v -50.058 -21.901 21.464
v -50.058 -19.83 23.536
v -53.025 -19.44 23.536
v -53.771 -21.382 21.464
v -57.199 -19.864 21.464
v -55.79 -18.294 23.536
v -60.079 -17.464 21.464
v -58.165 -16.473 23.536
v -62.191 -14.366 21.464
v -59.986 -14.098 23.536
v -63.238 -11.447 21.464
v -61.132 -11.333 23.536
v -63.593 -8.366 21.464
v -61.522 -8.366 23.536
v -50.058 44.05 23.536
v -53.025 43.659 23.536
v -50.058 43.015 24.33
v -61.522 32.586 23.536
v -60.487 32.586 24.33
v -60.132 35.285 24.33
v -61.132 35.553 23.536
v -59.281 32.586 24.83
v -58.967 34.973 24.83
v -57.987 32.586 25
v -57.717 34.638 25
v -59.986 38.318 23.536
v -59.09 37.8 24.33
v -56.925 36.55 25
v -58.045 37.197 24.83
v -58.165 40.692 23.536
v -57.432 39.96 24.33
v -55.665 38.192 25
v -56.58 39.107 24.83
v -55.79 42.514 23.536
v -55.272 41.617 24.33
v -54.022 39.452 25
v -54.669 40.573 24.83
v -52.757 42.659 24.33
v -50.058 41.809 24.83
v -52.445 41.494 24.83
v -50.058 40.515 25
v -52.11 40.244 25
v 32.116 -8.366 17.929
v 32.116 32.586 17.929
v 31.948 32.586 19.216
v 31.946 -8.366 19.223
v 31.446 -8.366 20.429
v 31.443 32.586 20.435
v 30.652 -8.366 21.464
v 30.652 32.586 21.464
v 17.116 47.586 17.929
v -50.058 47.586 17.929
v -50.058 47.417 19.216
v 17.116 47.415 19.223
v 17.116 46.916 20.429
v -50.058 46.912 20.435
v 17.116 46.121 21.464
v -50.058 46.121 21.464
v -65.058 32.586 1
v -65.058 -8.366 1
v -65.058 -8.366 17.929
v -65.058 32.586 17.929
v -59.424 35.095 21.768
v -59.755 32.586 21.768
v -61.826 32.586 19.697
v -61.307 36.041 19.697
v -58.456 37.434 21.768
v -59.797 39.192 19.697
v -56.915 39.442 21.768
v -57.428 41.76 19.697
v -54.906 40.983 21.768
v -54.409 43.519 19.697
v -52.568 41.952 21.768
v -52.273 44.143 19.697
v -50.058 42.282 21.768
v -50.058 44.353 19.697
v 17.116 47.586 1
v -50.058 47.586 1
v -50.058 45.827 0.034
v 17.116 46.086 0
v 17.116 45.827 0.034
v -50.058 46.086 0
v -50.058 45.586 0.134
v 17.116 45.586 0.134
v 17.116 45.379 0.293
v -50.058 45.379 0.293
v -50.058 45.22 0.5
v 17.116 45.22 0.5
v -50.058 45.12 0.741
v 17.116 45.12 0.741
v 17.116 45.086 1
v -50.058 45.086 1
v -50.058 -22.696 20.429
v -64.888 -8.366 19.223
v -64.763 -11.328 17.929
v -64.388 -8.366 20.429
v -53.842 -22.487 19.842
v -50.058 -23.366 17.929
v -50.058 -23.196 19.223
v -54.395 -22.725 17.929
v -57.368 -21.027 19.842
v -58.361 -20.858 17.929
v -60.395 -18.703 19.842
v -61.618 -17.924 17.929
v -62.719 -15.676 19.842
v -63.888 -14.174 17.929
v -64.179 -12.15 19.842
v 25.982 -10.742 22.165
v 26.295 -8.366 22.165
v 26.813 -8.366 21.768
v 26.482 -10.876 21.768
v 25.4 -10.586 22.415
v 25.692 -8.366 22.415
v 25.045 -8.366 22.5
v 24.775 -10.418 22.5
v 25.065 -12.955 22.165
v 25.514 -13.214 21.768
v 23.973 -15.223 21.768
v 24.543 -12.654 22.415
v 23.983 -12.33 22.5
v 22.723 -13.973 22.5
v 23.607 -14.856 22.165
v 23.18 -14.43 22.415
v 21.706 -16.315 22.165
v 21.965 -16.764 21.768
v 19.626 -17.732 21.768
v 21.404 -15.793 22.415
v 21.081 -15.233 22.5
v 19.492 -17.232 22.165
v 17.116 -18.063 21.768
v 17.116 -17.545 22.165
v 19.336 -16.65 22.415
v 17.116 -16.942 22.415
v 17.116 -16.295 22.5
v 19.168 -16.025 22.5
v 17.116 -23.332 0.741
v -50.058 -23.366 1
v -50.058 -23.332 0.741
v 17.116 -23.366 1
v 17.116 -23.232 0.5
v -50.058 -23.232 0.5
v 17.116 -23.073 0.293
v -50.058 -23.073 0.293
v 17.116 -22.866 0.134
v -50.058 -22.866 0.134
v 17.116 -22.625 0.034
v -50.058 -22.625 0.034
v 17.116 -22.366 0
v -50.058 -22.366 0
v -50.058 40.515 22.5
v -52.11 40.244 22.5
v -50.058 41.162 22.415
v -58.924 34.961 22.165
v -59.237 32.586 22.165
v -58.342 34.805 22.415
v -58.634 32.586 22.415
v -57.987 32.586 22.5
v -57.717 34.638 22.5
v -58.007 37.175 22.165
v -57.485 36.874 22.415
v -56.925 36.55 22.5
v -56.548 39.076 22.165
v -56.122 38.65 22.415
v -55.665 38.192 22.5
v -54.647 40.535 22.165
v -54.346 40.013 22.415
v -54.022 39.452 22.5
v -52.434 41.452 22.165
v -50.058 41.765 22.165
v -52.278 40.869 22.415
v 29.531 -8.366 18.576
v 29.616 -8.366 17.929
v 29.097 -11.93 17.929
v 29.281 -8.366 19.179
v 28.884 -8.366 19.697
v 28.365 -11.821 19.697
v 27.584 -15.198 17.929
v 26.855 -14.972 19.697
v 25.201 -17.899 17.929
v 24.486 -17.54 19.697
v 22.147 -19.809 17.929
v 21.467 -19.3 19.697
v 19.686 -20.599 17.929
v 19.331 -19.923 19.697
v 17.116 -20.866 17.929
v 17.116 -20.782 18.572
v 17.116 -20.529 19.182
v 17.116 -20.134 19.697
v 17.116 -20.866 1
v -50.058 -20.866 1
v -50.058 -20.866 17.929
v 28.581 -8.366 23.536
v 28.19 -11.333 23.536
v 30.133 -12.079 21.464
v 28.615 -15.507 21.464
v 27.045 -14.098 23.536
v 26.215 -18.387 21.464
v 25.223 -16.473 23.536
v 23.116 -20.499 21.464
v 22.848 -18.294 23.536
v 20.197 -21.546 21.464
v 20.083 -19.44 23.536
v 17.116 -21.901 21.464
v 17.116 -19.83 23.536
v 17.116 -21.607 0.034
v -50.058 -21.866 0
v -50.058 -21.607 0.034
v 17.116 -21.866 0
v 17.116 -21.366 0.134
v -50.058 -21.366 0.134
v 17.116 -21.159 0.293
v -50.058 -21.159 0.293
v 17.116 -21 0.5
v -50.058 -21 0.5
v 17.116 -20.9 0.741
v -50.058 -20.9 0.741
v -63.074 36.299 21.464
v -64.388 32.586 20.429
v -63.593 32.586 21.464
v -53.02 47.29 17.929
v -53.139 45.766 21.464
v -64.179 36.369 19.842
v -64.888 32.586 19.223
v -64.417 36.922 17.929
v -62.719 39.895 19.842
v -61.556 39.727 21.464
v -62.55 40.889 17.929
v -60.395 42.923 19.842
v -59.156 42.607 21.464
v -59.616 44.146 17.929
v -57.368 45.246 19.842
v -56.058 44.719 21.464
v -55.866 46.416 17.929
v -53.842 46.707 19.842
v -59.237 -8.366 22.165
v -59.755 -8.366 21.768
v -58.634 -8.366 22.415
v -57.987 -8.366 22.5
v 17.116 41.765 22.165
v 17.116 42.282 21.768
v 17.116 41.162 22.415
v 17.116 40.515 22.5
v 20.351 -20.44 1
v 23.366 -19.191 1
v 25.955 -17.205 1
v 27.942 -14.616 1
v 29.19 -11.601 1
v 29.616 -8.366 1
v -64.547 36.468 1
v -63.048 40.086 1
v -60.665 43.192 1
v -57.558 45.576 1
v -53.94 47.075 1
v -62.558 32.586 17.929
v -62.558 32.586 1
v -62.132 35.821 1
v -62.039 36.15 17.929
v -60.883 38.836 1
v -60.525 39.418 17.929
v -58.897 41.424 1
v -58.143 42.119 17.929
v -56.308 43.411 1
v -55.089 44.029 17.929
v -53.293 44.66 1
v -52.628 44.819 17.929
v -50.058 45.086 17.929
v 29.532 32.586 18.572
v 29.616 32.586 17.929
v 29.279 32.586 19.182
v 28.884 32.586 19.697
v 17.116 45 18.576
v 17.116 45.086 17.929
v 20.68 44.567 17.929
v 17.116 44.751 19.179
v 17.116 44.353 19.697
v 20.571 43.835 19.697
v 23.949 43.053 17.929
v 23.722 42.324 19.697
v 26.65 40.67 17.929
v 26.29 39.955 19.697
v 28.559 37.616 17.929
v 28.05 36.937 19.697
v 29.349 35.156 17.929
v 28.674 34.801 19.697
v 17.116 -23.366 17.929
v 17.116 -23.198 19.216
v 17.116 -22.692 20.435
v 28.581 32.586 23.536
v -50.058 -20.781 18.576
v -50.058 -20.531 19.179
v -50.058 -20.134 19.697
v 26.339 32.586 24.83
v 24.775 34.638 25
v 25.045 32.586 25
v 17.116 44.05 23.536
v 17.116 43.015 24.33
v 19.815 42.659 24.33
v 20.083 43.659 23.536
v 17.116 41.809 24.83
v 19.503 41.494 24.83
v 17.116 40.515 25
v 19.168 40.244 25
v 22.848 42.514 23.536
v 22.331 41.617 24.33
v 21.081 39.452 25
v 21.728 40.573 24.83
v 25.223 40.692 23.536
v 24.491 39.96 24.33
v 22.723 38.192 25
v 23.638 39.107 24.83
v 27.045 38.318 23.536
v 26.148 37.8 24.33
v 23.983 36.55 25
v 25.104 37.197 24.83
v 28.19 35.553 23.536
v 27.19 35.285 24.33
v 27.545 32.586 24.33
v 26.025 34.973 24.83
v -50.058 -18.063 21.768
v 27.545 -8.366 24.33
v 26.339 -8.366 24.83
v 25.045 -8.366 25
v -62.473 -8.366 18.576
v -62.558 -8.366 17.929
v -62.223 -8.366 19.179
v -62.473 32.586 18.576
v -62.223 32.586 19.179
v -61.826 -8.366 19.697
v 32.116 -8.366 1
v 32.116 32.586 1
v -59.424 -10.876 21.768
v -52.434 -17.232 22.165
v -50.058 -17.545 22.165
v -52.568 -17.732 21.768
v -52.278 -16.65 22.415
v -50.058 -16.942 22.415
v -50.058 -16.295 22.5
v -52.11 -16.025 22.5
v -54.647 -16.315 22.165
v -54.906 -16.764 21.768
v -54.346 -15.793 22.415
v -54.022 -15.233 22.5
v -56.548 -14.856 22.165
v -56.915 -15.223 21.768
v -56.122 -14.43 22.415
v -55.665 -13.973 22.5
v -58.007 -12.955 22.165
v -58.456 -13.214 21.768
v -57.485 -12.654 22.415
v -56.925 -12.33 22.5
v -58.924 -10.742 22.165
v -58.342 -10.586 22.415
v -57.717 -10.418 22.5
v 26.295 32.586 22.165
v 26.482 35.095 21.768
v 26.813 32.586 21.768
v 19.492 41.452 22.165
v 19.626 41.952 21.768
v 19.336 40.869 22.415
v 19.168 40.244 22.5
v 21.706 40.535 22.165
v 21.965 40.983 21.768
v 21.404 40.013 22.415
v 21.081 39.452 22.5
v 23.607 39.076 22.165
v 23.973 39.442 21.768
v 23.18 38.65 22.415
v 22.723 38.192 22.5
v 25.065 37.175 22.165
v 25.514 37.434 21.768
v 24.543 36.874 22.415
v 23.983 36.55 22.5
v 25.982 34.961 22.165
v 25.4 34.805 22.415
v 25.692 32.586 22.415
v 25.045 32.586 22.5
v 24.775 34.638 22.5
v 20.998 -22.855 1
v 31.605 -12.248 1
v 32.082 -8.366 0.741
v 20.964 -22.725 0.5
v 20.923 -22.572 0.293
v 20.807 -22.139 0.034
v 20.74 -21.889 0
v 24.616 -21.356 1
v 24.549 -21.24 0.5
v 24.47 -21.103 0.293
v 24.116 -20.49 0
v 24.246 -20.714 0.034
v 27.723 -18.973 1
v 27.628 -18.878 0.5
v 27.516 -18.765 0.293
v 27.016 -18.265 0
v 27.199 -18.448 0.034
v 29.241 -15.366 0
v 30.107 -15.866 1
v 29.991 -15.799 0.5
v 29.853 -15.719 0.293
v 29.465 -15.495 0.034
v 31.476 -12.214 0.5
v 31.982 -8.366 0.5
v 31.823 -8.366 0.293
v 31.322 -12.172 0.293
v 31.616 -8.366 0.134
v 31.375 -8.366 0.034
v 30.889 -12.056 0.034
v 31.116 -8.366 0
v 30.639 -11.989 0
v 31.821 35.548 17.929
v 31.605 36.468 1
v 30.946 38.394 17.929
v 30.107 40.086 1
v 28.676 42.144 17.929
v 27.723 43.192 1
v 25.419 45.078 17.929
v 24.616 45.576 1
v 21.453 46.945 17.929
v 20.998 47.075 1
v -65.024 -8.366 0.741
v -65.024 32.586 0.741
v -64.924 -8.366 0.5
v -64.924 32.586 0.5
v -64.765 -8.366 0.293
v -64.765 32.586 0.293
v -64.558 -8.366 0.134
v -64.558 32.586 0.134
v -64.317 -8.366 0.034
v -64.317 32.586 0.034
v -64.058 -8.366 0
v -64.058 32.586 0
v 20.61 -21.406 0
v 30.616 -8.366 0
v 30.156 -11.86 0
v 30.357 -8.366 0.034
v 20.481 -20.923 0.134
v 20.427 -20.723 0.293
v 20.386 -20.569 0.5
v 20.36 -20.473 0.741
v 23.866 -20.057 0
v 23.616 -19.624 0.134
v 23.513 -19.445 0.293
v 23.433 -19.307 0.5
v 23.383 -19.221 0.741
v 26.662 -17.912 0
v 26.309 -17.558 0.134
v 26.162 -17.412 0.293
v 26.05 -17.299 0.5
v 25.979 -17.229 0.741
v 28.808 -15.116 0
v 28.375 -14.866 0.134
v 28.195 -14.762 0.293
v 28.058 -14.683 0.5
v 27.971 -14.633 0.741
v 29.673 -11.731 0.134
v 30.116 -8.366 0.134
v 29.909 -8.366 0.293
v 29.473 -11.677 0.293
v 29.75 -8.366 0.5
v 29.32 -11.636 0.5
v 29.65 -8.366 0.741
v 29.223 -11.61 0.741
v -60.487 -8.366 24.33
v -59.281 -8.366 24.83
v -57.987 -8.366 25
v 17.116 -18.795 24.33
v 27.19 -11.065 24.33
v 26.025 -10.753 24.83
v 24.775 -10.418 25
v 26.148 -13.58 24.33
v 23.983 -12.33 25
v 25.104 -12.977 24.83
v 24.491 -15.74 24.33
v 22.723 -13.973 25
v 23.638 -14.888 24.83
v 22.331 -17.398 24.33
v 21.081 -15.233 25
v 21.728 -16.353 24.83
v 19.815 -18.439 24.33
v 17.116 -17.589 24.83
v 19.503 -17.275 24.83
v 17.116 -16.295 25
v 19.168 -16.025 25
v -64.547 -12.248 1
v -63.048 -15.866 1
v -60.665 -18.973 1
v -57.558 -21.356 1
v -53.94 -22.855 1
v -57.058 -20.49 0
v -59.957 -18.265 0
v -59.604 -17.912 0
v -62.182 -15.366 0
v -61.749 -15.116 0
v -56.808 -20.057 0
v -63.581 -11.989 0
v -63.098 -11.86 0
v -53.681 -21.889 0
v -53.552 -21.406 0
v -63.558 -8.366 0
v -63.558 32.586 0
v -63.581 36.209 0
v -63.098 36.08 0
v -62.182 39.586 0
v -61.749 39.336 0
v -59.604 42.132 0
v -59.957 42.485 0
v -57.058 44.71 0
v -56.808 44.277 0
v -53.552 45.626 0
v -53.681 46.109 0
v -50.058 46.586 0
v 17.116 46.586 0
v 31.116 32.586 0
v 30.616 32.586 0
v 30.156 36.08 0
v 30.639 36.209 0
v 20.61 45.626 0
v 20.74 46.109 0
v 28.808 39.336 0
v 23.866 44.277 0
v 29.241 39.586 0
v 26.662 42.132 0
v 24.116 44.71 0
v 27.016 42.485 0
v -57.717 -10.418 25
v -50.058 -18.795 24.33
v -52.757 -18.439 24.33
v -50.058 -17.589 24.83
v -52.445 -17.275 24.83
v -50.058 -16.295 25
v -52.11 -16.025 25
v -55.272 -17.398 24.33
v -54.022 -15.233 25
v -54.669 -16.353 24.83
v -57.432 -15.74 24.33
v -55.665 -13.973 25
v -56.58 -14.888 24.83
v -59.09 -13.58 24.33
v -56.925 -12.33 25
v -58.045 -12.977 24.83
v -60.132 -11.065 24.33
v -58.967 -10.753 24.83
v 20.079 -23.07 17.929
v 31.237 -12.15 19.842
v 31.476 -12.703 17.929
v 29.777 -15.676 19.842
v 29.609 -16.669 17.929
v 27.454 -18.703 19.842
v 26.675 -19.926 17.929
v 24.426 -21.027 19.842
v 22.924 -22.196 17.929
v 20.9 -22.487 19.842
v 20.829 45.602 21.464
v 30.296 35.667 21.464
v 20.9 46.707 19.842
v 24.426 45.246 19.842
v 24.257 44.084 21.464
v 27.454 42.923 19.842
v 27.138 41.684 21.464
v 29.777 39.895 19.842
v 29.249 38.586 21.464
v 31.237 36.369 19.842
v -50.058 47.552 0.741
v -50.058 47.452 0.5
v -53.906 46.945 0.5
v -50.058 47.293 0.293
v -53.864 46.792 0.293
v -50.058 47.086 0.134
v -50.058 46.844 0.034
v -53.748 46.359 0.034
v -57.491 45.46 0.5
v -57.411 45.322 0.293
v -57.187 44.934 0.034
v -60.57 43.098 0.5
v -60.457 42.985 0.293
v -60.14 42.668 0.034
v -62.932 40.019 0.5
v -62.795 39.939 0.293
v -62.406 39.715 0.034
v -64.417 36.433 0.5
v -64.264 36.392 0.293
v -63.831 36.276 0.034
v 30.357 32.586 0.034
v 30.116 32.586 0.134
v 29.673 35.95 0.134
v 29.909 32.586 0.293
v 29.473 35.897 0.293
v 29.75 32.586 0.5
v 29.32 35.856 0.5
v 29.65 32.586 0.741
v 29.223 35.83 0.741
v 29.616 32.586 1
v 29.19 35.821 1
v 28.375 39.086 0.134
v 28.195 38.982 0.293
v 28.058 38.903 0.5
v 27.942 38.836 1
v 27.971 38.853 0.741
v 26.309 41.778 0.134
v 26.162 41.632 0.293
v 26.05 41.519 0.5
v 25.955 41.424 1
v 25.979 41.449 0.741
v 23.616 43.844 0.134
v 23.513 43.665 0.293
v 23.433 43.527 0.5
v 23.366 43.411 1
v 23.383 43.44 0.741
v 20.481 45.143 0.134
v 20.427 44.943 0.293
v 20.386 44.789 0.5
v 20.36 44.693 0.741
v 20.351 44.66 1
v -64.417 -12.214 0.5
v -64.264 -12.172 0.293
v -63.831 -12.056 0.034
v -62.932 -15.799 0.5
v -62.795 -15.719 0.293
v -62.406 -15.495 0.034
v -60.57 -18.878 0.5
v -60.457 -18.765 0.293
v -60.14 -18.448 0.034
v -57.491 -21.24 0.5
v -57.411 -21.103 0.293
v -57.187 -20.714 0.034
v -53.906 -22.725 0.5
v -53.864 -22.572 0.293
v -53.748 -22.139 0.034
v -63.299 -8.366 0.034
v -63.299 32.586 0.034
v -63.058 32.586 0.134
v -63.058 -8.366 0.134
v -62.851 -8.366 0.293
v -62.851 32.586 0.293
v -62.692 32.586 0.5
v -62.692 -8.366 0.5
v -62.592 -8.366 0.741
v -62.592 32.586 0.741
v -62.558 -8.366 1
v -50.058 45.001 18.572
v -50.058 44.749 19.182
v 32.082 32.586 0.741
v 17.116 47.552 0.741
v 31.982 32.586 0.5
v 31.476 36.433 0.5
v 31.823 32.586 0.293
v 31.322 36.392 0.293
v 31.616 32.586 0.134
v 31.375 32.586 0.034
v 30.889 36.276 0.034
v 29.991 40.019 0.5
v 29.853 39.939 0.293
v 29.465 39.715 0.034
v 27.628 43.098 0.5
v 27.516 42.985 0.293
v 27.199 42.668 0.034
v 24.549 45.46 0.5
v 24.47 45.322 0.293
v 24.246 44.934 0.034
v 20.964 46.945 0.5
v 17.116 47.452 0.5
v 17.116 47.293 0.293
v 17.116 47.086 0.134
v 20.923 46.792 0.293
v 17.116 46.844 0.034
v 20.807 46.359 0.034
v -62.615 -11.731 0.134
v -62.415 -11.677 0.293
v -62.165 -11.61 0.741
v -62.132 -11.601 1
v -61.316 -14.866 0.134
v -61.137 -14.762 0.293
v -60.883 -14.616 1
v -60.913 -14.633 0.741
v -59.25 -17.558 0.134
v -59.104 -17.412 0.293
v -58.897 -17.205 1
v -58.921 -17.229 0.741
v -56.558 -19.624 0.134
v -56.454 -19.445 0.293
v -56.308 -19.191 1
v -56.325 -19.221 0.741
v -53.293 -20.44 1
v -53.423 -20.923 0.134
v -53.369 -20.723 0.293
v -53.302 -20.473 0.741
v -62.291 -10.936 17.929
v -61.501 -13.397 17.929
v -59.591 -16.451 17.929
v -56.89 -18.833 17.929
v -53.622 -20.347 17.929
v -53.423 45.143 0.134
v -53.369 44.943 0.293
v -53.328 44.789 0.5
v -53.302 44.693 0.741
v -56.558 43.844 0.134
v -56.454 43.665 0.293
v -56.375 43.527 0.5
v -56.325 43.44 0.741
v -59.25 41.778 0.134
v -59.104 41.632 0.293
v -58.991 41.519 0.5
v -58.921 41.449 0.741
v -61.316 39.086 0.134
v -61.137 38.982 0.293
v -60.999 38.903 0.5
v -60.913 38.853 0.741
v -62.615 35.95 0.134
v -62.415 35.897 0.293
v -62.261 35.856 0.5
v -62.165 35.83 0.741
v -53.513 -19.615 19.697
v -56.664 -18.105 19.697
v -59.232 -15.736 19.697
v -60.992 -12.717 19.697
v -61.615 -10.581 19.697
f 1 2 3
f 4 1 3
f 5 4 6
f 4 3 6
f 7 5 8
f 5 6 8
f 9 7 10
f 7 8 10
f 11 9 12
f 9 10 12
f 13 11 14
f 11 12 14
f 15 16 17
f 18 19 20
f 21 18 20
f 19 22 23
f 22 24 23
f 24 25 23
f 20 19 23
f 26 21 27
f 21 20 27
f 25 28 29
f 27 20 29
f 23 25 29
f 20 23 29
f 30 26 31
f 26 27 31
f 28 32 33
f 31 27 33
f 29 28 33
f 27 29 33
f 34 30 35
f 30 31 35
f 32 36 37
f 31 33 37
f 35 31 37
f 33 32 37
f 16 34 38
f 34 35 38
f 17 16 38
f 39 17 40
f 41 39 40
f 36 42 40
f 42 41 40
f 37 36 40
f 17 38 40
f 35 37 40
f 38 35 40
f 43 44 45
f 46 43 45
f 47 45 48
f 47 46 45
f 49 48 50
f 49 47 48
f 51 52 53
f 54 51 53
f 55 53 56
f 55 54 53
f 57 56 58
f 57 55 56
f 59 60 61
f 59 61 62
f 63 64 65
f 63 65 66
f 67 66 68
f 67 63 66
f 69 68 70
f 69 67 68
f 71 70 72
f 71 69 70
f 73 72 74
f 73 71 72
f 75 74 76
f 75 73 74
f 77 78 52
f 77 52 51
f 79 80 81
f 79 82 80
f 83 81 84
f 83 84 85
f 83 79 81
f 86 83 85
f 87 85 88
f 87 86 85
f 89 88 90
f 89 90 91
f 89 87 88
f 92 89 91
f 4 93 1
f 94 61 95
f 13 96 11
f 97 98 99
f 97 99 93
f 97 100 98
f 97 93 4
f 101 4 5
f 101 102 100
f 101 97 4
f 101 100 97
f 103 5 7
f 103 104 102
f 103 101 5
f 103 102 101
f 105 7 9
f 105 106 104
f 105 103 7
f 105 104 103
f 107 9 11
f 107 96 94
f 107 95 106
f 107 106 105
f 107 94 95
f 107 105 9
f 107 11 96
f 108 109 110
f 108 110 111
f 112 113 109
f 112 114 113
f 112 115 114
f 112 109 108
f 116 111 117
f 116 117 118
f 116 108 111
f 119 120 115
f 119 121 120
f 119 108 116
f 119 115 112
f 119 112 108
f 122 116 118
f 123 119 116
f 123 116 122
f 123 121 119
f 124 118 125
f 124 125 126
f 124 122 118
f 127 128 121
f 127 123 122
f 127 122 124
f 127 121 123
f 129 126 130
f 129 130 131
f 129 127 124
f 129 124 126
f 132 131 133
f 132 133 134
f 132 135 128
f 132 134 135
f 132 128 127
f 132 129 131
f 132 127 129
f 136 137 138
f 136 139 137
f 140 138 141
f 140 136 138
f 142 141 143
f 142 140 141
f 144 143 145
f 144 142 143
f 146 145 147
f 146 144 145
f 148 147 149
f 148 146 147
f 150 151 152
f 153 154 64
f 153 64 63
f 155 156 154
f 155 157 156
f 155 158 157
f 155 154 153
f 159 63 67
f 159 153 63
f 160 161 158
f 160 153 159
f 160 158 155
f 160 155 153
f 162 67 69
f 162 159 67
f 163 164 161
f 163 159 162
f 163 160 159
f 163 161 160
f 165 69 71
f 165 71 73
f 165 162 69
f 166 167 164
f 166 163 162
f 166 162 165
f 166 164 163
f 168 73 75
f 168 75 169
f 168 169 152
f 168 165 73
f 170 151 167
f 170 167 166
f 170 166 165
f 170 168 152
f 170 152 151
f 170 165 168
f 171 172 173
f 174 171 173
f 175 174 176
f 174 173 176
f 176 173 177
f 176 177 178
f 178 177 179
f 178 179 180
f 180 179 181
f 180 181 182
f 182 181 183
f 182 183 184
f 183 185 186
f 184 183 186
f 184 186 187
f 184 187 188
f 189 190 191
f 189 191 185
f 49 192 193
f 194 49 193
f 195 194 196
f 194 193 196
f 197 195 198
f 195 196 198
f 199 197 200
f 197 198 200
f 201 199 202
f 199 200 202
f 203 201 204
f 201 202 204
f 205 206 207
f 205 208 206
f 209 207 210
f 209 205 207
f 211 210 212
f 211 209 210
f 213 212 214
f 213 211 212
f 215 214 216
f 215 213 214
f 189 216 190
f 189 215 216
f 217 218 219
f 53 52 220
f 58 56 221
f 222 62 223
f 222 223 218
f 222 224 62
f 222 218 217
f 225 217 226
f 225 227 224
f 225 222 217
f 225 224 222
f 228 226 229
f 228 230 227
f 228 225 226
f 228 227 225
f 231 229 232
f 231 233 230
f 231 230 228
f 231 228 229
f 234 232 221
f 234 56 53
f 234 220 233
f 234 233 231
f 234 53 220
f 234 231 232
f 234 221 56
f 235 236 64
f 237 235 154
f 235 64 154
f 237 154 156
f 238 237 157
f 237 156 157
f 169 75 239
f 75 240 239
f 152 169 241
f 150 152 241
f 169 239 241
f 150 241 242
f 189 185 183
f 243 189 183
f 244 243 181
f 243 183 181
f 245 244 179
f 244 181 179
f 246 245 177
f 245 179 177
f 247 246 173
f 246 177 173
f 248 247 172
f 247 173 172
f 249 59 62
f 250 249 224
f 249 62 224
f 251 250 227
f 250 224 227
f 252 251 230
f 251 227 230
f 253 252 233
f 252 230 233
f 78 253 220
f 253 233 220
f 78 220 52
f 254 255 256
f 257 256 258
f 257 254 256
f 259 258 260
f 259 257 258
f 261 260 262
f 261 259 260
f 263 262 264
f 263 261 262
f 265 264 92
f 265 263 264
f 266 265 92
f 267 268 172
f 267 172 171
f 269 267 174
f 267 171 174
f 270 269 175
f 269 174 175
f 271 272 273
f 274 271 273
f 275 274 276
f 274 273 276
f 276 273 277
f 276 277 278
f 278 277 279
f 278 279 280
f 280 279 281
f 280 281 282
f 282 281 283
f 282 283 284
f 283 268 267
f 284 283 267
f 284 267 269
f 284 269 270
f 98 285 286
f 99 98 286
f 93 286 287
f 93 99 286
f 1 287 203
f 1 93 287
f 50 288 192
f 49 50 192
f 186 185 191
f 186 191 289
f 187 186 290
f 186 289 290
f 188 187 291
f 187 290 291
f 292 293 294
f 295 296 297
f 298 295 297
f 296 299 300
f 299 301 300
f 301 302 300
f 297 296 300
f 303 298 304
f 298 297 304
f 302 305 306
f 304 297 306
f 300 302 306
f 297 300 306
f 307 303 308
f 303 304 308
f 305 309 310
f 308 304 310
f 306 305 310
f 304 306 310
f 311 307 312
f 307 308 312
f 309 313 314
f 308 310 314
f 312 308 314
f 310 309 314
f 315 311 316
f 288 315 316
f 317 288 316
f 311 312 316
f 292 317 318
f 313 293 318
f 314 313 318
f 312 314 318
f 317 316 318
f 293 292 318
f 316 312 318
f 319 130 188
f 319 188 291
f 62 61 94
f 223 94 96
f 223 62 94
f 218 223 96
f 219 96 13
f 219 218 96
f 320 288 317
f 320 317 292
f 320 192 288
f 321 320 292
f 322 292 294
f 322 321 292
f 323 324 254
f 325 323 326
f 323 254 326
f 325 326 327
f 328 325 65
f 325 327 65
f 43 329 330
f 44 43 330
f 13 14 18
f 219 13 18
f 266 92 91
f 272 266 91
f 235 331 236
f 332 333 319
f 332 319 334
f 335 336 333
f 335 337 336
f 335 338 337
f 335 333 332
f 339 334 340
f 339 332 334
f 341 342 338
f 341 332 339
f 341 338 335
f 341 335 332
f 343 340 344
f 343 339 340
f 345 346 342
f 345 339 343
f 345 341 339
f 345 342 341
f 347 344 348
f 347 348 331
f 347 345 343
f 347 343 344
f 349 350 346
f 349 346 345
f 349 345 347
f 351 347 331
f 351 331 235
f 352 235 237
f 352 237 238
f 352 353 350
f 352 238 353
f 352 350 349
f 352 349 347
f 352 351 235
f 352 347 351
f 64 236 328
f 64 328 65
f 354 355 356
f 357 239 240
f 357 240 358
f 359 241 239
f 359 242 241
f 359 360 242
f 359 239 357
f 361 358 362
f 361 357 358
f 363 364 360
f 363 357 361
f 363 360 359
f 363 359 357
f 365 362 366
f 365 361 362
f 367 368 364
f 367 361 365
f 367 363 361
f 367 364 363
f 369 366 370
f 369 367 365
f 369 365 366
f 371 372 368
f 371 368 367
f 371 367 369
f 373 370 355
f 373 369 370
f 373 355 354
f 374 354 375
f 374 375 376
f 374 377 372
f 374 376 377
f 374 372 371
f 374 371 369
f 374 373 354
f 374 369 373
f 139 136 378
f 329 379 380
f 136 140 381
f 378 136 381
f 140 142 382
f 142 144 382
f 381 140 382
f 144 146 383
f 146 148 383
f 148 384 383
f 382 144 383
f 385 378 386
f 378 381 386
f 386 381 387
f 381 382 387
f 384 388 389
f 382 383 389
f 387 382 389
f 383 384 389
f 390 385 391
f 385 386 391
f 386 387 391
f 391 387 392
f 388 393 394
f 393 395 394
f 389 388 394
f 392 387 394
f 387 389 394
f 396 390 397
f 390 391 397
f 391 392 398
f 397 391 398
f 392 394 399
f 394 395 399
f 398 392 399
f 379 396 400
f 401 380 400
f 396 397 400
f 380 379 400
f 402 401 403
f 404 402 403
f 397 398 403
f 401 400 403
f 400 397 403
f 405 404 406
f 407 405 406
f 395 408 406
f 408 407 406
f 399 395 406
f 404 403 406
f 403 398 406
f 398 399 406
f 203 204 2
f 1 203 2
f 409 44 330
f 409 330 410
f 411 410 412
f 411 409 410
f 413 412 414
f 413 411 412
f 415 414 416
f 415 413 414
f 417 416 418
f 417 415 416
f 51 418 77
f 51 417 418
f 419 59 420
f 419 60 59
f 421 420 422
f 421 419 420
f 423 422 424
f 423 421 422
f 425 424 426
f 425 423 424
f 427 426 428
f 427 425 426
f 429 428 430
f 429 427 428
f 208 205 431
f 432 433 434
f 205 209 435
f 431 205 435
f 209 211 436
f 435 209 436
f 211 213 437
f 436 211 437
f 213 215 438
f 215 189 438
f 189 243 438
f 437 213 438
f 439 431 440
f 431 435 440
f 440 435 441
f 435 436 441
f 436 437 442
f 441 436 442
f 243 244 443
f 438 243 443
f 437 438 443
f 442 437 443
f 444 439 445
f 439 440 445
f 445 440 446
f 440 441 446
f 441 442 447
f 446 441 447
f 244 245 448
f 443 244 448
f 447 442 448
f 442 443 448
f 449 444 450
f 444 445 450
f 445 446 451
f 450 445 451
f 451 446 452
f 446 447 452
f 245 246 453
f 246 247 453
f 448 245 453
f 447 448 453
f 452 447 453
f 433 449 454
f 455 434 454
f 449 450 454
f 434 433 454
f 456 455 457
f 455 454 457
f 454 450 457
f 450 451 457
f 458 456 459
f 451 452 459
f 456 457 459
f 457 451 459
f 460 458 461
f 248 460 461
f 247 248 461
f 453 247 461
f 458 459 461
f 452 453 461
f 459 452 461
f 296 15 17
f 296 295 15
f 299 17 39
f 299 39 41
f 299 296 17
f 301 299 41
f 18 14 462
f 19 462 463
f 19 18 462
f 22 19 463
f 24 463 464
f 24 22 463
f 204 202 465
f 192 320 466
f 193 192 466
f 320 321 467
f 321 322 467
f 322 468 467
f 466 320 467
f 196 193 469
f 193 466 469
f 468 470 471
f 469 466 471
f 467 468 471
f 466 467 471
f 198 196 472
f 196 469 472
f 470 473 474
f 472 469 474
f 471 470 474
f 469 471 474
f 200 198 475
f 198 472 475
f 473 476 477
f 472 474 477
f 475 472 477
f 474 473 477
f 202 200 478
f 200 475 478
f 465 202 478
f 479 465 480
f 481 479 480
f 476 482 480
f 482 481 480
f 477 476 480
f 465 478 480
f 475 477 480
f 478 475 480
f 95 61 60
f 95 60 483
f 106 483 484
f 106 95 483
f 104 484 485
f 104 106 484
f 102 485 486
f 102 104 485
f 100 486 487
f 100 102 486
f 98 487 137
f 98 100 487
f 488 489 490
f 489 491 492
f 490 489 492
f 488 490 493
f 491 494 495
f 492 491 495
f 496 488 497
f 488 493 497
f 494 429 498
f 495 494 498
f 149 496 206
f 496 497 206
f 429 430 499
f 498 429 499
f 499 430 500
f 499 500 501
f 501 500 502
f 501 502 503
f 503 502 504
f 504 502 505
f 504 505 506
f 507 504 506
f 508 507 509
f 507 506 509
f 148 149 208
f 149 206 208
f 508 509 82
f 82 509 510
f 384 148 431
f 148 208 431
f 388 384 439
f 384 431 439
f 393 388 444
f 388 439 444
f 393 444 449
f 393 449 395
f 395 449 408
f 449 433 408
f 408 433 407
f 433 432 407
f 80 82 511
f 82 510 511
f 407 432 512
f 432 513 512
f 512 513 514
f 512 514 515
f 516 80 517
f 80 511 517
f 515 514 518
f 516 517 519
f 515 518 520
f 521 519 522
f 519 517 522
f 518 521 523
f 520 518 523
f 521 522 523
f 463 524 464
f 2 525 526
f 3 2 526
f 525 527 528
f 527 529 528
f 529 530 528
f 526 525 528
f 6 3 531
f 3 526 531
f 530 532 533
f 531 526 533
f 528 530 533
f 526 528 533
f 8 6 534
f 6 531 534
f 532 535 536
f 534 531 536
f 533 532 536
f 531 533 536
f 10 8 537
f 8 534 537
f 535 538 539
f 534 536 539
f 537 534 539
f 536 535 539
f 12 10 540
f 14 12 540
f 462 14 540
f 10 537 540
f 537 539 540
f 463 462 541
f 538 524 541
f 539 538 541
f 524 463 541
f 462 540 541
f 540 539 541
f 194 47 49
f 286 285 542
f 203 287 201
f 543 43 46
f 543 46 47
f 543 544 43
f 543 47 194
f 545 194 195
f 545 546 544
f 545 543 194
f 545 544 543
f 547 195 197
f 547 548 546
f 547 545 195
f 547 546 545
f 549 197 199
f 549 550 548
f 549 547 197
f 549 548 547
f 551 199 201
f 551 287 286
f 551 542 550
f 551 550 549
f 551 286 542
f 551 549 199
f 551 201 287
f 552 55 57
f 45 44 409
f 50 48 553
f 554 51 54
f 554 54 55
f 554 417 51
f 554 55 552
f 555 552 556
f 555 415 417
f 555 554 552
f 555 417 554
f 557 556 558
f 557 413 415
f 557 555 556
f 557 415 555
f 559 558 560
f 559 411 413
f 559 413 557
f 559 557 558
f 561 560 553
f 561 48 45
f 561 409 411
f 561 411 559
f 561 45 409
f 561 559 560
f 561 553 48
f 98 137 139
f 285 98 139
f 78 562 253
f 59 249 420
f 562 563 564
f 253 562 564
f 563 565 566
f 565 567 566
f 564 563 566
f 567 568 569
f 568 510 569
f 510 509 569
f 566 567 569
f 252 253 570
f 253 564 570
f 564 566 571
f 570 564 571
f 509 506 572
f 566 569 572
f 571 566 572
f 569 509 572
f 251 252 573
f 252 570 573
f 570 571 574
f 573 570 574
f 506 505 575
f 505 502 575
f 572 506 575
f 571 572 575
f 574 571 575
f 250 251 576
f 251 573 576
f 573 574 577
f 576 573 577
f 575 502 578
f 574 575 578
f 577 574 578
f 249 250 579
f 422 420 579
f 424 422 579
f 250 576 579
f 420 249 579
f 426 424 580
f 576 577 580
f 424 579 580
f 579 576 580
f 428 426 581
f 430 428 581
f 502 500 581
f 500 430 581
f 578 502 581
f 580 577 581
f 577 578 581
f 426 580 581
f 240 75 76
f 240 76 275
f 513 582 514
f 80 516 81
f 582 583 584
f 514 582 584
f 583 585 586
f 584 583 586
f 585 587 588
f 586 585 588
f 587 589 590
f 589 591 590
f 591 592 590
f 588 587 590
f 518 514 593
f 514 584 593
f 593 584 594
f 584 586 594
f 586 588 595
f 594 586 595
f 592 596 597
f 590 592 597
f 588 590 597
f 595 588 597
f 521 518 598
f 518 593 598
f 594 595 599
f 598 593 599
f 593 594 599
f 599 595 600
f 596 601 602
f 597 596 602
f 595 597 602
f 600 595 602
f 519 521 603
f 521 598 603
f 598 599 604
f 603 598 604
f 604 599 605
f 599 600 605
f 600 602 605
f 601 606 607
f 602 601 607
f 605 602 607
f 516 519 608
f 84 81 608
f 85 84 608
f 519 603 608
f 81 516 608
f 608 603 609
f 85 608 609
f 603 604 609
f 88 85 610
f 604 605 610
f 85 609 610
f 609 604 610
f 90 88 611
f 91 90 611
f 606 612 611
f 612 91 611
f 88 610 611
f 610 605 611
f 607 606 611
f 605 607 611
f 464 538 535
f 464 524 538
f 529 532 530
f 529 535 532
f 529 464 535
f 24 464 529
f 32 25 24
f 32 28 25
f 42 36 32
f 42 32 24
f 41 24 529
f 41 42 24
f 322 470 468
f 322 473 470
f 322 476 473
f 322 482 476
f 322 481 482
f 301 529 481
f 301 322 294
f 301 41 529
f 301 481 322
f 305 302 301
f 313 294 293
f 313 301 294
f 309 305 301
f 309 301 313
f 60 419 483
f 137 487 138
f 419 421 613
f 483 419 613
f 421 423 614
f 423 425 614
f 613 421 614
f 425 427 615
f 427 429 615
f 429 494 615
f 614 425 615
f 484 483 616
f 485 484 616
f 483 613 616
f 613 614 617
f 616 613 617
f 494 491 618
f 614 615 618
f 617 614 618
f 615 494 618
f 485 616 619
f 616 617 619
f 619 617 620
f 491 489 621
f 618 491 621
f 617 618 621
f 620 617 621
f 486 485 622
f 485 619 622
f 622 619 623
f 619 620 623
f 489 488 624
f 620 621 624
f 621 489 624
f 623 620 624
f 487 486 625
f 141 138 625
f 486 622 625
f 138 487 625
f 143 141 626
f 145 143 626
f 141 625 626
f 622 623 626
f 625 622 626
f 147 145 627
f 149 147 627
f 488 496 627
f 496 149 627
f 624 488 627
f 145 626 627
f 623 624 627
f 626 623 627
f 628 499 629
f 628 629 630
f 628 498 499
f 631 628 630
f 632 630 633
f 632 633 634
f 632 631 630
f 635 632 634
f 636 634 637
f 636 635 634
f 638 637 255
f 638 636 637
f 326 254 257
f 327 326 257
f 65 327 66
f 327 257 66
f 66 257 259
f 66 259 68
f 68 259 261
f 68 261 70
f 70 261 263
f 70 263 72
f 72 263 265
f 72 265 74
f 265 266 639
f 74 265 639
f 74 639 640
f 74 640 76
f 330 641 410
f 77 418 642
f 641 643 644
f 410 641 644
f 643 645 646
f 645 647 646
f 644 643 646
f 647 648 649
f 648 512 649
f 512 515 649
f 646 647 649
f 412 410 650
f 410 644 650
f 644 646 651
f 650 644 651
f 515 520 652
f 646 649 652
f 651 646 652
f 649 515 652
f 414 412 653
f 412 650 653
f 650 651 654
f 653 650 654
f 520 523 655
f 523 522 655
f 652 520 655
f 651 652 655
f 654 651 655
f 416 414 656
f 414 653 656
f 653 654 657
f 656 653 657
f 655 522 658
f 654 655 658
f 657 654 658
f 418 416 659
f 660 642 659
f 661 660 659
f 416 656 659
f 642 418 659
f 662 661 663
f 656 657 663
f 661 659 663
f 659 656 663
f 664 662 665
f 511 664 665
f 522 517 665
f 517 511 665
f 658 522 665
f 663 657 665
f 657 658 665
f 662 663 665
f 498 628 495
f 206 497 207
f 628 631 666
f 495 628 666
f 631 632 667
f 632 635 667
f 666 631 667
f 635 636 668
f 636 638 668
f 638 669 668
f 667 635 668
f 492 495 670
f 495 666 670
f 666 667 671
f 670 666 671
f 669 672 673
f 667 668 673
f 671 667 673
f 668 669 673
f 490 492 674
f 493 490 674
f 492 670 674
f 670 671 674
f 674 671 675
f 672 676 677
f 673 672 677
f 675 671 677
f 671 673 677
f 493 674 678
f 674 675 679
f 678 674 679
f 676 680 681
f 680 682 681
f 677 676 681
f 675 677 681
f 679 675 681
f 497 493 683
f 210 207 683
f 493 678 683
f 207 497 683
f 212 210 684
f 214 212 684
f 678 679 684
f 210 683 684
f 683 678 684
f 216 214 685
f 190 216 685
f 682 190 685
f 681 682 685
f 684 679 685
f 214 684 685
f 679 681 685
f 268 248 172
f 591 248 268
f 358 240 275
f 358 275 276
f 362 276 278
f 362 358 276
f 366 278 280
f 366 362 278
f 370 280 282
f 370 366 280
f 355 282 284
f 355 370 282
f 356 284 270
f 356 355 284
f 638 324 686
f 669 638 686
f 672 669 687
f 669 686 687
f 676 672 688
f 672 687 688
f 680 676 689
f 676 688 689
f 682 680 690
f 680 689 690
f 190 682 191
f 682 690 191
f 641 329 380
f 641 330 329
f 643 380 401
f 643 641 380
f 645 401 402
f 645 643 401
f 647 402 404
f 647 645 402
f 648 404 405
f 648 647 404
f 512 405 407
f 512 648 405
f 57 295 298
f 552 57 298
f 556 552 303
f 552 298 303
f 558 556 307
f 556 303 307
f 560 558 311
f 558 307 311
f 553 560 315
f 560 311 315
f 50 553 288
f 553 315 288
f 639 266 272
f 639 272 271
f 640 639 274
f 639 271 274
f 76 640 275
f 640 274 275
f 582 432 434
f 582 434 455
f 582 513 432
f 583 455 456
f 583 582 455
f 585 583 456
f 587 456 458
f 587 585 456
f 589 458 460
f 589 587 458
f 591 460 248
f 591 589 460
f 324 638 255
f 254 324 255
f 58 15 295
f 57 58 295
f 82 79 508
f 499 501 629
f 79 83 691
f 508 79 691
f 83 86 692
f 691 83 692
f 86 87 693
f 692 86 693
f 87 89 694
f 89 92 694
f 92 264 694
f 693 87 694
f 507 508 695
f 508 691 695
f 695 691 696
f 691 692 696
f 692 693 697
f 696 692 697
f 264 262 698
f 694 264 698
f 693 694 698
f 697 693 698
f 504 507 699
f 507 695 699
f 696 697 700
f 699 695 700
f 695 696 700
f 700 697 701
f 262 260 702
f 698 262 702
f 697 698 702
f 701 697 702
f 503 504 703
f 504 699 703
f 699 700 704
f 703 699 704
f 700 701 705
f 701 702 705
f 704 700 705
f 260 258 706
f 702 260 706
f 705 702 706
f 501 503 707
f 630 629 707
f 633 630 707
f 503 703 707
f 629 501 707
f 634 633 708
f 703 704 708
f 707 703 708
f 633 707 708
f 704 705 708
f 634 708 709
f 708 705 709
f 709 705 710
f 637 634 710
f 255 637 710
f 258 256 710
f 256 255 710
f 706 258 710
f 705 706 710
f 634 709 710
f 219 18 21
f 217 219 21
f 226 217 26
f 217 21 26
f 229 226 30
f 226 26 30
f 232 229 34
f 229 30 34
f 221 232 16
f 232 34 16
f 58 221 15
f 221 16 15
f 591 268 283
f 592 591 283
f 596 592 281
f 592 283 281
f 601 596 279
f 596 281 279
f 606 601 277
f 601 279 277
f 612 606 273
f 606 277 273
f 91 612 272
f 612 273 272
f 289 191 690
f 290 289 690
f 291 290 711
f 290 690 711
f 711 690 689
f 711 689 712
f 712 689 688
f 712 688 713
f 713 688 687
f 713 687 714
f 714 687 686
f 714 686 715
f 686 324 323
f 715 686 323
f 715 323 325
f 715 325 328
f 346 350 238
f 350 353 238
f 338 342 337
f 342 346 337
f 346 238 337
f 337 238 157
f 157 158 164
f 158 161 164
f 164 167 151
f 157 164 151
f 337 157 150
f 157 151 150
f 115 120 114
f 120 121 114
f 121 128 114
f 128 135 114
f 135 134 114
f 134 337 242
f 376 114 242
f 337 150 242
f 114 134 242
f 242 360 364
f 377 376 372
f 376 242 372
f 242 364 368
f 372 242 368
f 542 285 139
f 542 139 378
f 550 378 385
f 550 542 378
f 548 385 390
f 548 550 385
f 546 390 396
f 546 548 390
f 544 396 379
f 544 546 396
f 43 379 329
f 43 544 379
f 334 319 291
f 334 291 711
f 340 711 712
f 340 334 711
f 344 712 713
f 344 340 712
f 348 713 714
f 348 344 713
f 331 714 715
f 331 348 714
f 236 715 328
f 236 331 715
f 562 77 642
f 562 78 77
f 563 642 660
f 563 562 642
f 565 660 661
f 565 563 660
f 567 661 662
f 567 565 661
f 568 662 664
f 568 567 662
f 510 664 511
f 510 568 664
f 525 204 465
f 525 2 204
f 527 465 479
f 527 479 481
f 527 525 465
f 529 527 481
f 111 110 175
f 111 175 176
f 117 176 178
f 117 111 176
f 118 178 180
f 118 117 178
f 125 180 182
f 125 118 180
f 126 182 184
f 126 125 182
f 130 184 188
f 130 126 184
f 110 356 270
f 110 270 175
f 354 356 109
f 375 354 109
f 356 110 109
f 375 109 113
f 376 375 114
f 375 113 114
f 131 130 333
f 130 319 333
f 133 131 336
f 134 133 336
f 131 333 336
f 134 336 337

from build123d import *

# Parameters (mm, degrees)
F0_W     = 97.1741192043
F0_H     = 70.9515530616
F1_DEPTH = 25
F2_R     = 15
F3_SIZE  = 5
F4_R     = 5
F5_T     = -2.5
F6_R     = 1


with BuildPart() as f1:
    # F0 (on Top) → F1 (new body)
    with BuildSketch(Plane.XY):
        with Locations((-16.4708662778, 12.1098598465)):
            Rectangle(F0_W, F0_H)
    extrude(amount=F1_DEPTH)

    # F2
    f2_edges = [f1.edges().sort_by_distance(p)[0] for p in [
        (-65.057926, -23.365917, 12.5),
        (32.116193, -23.365917, 12.5),
        (32.116193, 47.585636, 12.5),
        (-65.057926, 47.585636, 12.5),
    ]]
    fillet(f2_edges, radius=F2_R)

    # F3
    f3_edges = [f1.edges().sort_by_distance(p)[0] for p in [
        (-65.057926, 12.10986, 25),
    ]]
    chamfer(f3_edges, length=F3_SIZE)

    # F4
    f4_edges = [f1.edges().sort_by_distance(p)[0] for p in [
        (-65.057926, 12.10986, 20),
        (-60.057926, 12.10986, 25),
    ]]
    fillet(f4_edges, radius=F4_R)

    # F5
    f5_openings = [f1.faces().sort_by_distance(p)[0] for p in [
        (-16.470866, 12.10986, 0),
    ]]
    offset(amount=F5_T, openings=f5_openings)

    # F6
    f6_edges = [f1.edges().sort_by_distance(p)[0] for p in [
        (-16.470866, -20.865917, 0),
        (-60.664528, -18.972518, 0),
    ]]
    fillet(f6_edges, radius=F6_R)


solid = f1.part
